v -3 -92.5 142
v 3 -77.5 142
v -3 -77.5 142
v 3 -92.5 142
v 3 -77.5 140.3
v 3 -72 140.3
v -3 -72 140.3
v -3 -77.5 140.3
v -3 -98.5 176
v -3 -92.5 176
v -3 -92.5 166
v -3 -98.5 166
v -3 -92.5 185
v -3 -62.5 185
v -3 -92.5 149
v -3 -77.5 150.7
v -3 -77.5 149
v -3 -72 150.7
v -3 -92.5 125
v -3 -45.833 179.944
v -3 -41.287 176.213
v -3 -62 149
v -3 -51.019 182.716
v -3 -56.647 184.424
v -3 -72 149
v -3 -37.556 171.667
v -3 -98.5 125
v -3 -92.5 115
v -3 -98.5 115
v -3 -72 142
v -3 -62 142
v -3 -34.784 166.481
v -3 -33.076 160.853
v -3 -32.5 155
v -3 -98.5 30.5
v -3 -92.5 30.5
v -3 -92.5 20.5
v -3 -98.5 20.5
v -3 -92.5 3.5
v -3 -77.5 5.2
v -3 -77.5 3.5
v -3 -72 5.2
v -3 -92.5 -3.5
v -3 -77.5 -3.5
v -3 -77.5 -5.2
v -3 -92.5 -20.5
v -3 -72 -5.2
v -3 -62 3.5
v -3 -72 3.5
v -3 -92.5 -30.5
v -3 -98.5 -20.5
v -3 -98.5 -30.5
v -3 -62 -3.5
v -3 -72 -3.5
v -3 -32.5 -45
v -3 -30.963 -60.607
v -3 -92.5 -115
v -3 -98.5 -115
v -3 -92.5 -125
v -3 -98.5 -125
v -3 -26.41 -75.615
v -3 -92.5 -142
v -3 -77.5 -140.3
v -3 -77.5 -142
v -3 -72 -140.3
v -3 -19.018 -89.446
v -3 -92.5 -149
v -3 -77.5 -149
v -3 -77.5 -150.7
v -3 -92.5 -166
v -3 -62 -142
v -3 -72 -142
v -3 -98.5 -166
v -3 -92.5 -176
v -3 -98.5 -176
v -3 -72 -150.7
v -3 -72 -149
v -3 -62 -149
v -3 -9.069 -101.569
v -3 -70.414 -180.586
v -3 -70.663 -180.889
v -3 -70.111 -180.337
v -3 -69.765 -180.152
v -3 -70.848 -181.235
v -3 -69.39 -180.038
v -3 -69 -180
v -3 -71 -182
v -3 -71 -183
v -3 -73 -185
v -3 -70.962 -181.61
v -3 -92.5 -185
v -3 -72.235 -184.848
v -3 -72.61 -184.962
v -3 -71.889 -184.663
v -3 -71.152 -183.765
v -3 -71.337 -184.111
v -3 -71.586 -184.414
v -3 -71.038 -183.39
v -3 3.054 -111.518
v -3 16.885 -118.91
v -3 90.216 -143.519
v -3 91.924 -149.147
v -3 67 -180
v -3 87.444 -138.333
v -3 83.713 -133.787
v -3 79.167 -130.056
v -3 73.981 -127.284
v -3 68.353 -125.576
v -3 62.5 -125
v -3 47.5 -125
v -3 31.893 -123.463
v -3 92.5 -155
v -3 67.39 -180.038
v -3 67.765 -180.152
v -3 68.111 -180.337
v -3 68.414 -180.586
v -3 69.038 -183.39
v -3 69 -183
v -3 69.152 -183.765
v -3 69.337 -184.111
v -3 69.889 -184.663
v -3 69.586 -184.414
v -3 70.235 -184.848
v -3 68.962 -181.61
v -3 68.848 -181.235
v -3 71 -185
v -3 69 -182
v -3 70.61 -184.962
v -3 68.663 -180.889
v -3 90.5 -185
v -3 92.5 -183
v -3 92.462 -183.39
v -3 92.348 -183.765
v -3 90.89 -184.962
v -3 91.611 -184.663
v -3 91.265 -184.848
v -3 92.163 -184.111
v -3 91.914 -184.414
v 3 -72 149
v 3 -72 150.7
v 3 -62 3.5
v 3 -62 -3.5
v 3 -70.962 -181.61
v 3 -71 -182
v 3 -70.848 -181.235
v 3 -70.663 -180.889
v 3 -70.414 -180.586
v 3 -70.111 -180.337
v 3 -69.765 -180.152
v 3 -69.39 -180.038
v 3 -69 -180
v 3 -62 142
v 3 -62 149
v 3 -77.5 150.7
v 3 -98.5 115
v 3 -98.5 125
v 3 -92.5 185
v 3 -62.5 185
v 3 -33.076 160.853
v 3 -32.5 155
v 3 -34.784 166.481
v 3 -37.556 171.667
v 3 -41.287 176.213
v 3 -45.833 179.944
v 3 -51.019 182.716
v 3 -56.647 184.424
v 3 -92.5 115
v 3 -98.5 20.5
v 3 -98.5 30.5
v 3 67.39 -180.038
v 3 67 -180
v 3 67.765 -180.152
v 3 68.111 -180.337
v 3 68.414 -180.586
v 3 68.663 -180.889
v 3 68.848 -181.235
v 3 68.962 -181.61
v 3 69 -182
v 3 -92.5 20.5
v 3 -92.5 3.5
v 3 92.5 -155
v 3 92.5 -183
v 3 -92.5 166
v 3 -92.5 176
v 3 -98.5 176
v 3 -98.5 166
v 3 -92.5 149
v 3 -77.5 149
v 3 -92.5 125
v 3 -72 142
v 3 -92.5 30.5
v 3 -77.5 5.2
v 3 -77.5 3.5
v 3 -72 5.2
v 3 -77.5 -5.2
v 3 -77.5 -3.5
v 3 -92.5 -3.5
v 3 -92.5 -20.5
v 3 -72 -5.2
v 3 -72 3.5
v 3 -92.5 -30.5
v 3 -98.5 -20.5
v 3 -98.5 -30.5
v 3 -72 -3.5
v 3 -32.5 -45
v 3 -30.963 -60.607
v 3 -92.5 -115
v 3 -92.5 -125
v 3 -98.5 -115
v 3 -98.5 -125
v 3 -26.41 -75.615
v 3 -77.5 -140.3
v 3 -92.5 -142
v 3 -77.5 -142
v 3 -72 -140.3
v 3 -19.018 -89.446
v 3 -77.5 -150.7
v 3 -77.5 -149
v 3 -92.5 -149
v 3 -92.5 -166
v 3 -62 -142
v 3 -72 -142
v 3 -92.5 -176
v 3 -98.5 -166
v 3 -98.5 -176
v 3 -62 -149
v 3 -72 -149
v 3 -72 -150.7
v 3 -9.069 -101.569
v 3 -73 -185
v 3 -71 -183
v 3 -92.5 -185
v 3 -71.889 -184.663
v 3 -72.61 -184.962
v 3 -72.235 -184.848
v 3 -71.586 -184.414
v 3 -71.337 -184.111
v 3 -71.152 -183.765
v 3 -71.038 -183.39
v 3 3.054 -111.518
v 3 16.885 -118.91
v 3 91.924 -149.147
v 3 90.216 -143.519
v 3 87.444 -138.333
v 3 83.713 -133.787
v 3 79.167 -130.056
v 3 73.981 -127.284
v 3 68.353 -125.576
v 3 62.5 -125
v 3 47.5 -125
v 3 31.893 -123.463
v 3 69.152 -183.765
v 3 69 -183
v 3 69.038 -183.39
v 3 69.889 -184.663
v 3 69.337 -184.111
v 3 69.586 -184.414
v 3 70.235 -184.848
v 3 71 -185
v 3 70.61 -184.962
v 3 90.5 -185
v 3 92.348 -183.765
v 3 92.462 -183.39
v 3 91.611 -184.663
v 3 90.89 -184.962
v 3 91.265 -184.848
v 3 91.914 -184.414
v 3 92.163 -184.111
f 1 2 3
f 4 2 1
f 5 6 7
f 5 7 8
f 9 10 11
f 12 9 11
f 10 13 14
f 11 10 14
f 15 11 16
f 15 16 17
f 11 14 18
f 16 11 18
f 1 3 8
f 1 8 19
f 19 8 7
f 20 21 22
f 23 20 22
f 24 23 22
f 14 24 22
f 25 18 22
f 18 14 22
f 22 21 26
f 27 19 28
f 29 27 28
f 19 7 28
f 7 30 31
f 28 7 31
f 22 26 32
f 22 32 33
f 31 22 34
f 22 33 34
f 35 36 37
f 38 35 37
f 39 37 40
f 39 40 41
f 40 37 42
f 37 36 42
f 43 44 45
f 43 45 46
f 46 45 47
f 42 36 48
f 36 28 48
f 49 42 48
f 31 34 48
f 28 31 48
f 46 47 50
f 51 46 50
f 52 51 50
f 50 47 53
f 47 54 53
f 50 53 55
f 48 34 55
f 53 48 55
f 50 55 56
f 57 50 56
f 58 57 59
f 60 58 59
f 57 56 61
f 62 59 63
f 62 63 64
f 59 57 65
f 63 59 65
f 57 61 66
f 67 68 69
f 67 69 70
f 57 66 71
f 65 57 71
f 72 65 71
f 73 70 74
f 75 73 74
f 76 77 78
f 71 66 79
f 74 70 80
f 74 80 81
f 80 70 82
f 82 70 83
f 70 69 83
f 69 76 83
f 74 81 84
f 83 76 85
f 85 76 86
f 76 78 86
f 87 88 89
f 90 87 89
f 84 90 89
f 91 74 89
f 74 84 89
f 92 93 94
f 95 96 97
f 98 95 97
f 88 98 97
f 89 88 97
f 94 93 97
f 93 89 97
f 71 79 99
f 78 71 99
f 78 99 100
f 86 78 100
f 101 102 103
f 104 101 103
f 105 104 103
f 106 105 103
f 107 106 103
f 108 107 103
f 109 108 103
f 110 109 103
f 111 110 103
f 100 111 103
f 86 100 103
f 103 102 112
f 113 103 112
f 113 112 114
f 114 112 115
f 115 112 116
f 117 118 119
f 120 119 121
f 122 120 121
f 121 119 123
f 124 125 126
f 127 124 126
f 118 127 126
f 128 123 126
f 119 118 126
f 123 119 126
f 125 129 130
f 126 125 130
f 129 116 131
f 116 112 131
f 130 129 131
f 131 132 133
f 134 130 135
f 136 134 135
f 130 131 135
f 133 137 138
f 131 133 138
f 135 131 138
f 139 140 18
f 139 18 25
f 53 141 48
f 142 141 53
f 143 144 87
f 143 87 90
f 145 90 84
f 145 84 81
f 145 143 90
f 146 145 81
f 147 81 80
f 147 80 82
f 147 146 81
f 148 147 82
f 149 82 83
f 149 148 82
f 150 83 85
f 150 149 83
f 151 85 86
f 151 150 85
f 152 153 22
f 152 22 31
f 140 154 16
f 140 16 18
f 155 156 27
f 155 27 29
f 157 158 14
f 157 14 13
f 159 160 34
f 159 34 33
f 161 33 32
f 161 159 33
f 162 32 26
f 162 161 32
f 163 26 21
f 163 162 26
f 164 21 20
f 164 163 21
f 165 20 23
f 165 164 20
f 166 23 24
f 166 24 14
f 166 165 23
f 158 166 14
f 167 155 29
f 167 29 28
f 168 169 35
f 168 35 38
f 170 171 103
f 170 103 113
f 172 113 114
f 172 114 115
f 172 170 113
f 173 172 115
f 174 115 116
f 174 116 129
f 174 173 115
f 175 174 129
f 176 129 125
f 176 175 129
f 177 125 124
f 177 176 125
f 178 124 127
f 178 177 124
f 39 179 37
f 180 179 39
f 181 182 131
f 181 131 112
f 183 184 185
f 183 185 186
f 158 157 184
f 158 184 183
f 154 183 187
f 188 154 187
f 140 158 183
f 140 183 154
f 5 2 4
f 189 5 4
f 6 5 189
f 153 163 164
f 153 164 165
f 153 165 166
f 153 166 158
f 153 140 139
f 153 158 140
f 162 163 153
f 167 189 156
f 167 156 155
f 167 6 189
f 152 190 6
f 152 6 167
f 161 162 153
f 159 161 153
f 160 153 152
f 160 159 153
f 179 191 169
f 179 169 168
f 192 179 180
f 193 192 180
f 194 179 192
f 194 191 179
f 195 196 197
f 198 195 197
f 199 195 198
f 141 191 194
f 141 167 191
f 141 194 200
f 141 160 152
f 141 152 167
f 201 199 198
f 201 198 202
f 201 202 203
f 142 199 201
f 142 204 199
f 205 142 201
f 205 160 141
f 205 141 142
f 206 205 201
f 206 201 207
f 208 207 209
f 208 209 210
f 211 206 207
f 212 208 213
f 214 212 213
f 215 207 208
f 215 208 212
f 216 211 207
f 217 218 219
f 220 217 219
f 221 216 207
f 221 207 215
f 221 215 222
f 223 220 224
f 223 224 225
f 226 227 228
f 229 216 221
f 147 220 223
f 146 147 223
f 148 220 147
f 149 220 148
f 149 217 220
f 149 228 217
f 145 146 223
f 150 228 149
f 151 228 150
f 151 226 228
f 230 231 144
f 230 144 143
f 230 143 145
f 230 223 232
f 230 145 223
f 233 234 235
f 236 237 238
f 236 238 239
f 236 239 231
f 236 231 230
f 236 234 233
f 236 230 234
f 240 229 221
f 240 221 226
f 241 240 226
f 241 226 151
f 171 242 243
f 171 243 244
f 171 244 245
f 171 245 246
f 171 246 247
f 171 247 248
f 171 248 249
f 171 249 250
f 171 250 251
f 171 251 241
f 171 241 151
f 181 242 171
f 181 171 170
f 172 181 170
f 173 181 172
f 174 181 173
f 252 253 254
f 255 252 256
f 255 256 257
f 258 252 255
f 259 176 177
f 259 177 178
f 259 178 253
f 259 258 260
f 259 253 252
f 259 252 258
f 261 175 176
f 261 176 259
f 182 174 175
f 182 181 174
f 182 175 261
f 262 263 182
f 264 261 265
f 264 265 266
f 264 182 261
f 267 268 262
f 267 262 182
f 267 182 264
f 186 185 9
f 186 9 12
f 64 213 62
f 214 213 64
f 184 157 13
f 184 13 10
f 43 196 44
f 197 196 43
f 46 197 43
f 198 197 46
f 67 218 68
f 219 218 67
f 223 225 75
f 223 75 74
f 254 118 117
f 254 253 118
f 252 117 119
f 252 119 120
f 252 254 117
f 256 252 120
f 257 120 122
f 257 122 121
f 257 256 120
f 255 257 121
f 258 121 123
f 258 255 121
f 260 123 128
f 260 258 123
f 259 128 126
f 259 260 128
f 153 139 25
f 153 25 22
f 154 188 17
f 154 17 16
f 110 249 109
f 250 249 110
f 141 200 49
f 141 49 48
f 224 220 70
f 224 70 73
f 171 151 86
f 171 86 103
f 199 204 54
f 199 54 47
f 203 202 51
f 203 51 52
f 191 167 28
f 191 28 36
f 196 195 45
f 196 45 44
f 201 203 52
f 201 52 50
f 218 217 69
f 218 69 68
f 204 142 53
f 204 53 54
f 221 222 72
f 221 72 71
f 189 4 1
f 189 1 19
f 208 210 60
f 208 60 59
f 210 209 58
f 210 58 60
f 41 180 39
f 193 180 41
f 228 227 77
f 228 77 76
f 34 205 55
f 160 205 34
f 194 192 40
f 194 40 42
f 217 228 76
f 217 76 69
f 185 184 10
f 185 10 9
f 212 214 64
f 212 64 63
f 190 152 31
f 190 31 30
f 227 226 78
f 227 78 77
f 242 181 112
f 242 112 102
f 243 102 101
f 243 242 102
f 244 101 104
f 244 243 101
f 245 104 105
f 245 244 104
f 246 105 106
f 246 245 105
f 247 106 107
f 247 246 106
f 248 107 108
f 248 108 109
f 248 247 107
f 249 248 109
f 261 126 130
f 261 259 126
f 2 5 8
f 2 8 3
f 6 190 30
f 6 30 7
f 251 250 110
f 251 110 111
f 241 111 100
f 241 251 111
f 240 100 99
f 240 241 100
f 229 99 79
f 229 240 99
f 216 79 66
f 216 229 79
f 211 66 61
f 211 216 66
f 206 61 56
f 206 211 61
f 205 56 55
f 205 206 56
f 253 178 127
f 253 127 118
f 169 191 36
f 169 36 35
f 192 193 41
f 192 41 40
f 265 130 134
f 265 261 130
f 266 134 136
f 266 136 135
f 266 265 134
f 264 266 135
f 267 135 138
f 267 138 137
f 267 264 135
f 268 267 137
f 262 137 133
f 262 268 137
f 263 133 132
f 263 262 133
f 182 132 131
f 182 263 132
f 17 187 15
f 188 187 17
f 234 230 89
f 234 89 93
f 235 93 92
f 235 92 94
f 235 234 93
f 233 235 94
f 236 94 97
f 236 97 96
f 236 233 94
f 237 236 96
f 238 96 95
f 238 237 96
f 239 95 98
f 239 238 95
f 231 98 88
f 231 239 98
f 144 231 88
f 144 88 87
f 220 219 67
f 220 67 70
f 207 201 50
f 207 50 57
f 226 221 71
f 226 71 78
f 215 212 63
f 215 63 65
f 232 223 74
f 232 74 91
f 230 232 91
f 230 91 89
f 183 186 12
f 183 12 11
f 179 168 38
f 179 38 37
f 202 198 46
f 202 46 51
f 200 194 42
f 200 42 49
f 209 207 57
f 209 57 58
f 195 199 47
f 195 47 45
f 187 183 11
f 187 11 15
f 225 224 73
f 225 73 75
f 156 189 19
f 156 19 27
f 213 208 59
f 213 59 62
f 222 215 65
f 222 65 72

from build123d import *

# Parameters (mm, degrees)
BOSS_EXTRUDE1_DEPTH = 3


with BuildPart() as part:
    # Sketch1 → Boss-Extrude1 (new, symmetric)
    with BuildSketch(Plane(origin=(0, 0, 0), x_dir=(0, 0, -1), z_dir=(1, 0, 0))):
        with BuildLine():
            ThreePointArc((185, 90.5), (184.414213562, 91.914213562), (183, 92.5))
            Line((183, 92.5), (155, 92.5))
            ThreePointArc((155, 92.5), (133.786796564, 83.713203436), (125, 62.5))
            Line((125, 62.5), (125, 47.5))
            ThreePointArc((125, 47.5), (101.568542495, -9.068542495), (45, -32.5))
            Line((45, -32.5), (-155, -32.5))
            ThreePointArc((-155, -32.5), (-176.213203436, -41.286796564), (-185, -62.5))
            Line((-185, -62.5), (-185, -92.5))
            Line((-185, -92.5), (-176, -92.5))
            Line((-176, -92.5), (-176, -98.5))
            Line((-176, -98.5), (-166, -98.5))
            Line((-166, -98.5), (-166, -92.5))
            Line((-166, -92.5), (-149, -92.5))
            Line((-149, -92.5), (-149, -77.5))
            Line((-149, -77.5), (-150.7, -77.5))
            Line((-150.7, -77.5), (-150.7, -72))
            Line((-150.7, -72), (-149, -72))
            Line((-149, -72), (-149, -62))
            Line((-149, -62), (-142, -62))
            Line((-142, -62), (-142, -72))
            Line((-142, -72), (-140.3, -72))
            Line((-140.3, -72), (-140.3, -77.5))
            Line((-140.3, -77.5), (-142, -77.5))
            Line((-142, -77.5), (-142, -92.5))
            Line((-142, -92.5), (-125, -92.5))
            Line((-125, -92.5), (-125, -98.5))
            Line((-125, -98.5), (-115, -98.5))
            Line((-115, -98.5), (-115, -92.5))
            Line((-115, -92.5), (-30.5, -92.5))
            Line((-30.5, -92.5), (-30.5, -98.5))
            Line((-30.5, -98.5), (-20.5, -98.5))
            Line((-20.5, -98.5), (-20.5, -92.5))
            Line((-20.5, -92.5), (-3.5, -92.5))
            Line((-3.5, -92.5), (-3.5, -77.5))
            Line((-3.5, -77.5), (-5.2, -77.5))
            Line((-5.2, -77.5), (-5.2, -72))
            Line((-5.2, -72), (-3.5, -72))
            Line((-3.5, -72), (-3.5, -62))
            Line((-3.5, -62), (3.5, -62))
            Line((3.5, -62), (3.5, -72))
            Line((3.5, -72), (5.2, -72))
            Line((5.2, -72), (5.2, -77.5))
            Line((5.2, -77.5), (3.5, -77.5))
            Line((3.5, -77.5), (3.5, -92.5))
            Line((3.5, -92.5), (20.5, -92.5))
            Line((20.5, -92.5), (20.5, -98.5))
            Line((20.5, -98.5), (30.5, -98.5))
            Line((30.5, -98.5), (30.5, -92.5))
            Line((30.5, -92.5), (115, -92.5))
            Line((115, -92.5), (115, -98.5))
            Line((115, -98.5), (125, -98.5))
            Line((125, -98.5), (125, -92.5))
            Line((125, -92.5), (142, -92.5))
            Line((142, -92.5), (142, -77.5))
            Line((142, -77.5), (140.3, -77.5))
            Line((140.3, -77.5), (140.3, -72))
            Line((140.3, -72), (142, -72))
            Line((142, -72), (142, -62))
            Line((142, -62), (149, -62))
            Line((149, -62), (149, -72))
            Line((149, -72), (150.7, -72))
            Line((150.7, -72), (150.7, -77.5))
            Line((150.7, -77.5), (149, -77.5))
            Line((149, -77.5), (149, -92.5))
            Line((149, -92.5), (166, -92.5))
            Line((166, -92.5), (166, -98.5))
            Line((166, -98.5), (176, -98.5))
            Line((176, -98.5), (176, -92.5))
            Line((176, -92.5), (185, -92.5))
            Line((185, -92.5), (185, -73))
            ThreePointArc((185, -73), (184.414213562, -71.585786438), (183, -71))
            Line((183, -71), (182, -71))
            ThreePointArc((182, -71), (180.585786438, -70.414213562), (180, -69))
            Line((180, -69), (180, 67))
            ThreePointArc((180, 67), (180.585786438, 68.414213562), (182, 69))
            Line((182, 69), (183, 69))
            ThreePointArc((183, 69), (184.414213562, 69.585786438), (185, 71))
            Line((185, 71), (185, 90.5))
        make_face()
    extrude(amount=BOSS_EXTRUDE1_DEPTH, both=True)


solid = part.part
